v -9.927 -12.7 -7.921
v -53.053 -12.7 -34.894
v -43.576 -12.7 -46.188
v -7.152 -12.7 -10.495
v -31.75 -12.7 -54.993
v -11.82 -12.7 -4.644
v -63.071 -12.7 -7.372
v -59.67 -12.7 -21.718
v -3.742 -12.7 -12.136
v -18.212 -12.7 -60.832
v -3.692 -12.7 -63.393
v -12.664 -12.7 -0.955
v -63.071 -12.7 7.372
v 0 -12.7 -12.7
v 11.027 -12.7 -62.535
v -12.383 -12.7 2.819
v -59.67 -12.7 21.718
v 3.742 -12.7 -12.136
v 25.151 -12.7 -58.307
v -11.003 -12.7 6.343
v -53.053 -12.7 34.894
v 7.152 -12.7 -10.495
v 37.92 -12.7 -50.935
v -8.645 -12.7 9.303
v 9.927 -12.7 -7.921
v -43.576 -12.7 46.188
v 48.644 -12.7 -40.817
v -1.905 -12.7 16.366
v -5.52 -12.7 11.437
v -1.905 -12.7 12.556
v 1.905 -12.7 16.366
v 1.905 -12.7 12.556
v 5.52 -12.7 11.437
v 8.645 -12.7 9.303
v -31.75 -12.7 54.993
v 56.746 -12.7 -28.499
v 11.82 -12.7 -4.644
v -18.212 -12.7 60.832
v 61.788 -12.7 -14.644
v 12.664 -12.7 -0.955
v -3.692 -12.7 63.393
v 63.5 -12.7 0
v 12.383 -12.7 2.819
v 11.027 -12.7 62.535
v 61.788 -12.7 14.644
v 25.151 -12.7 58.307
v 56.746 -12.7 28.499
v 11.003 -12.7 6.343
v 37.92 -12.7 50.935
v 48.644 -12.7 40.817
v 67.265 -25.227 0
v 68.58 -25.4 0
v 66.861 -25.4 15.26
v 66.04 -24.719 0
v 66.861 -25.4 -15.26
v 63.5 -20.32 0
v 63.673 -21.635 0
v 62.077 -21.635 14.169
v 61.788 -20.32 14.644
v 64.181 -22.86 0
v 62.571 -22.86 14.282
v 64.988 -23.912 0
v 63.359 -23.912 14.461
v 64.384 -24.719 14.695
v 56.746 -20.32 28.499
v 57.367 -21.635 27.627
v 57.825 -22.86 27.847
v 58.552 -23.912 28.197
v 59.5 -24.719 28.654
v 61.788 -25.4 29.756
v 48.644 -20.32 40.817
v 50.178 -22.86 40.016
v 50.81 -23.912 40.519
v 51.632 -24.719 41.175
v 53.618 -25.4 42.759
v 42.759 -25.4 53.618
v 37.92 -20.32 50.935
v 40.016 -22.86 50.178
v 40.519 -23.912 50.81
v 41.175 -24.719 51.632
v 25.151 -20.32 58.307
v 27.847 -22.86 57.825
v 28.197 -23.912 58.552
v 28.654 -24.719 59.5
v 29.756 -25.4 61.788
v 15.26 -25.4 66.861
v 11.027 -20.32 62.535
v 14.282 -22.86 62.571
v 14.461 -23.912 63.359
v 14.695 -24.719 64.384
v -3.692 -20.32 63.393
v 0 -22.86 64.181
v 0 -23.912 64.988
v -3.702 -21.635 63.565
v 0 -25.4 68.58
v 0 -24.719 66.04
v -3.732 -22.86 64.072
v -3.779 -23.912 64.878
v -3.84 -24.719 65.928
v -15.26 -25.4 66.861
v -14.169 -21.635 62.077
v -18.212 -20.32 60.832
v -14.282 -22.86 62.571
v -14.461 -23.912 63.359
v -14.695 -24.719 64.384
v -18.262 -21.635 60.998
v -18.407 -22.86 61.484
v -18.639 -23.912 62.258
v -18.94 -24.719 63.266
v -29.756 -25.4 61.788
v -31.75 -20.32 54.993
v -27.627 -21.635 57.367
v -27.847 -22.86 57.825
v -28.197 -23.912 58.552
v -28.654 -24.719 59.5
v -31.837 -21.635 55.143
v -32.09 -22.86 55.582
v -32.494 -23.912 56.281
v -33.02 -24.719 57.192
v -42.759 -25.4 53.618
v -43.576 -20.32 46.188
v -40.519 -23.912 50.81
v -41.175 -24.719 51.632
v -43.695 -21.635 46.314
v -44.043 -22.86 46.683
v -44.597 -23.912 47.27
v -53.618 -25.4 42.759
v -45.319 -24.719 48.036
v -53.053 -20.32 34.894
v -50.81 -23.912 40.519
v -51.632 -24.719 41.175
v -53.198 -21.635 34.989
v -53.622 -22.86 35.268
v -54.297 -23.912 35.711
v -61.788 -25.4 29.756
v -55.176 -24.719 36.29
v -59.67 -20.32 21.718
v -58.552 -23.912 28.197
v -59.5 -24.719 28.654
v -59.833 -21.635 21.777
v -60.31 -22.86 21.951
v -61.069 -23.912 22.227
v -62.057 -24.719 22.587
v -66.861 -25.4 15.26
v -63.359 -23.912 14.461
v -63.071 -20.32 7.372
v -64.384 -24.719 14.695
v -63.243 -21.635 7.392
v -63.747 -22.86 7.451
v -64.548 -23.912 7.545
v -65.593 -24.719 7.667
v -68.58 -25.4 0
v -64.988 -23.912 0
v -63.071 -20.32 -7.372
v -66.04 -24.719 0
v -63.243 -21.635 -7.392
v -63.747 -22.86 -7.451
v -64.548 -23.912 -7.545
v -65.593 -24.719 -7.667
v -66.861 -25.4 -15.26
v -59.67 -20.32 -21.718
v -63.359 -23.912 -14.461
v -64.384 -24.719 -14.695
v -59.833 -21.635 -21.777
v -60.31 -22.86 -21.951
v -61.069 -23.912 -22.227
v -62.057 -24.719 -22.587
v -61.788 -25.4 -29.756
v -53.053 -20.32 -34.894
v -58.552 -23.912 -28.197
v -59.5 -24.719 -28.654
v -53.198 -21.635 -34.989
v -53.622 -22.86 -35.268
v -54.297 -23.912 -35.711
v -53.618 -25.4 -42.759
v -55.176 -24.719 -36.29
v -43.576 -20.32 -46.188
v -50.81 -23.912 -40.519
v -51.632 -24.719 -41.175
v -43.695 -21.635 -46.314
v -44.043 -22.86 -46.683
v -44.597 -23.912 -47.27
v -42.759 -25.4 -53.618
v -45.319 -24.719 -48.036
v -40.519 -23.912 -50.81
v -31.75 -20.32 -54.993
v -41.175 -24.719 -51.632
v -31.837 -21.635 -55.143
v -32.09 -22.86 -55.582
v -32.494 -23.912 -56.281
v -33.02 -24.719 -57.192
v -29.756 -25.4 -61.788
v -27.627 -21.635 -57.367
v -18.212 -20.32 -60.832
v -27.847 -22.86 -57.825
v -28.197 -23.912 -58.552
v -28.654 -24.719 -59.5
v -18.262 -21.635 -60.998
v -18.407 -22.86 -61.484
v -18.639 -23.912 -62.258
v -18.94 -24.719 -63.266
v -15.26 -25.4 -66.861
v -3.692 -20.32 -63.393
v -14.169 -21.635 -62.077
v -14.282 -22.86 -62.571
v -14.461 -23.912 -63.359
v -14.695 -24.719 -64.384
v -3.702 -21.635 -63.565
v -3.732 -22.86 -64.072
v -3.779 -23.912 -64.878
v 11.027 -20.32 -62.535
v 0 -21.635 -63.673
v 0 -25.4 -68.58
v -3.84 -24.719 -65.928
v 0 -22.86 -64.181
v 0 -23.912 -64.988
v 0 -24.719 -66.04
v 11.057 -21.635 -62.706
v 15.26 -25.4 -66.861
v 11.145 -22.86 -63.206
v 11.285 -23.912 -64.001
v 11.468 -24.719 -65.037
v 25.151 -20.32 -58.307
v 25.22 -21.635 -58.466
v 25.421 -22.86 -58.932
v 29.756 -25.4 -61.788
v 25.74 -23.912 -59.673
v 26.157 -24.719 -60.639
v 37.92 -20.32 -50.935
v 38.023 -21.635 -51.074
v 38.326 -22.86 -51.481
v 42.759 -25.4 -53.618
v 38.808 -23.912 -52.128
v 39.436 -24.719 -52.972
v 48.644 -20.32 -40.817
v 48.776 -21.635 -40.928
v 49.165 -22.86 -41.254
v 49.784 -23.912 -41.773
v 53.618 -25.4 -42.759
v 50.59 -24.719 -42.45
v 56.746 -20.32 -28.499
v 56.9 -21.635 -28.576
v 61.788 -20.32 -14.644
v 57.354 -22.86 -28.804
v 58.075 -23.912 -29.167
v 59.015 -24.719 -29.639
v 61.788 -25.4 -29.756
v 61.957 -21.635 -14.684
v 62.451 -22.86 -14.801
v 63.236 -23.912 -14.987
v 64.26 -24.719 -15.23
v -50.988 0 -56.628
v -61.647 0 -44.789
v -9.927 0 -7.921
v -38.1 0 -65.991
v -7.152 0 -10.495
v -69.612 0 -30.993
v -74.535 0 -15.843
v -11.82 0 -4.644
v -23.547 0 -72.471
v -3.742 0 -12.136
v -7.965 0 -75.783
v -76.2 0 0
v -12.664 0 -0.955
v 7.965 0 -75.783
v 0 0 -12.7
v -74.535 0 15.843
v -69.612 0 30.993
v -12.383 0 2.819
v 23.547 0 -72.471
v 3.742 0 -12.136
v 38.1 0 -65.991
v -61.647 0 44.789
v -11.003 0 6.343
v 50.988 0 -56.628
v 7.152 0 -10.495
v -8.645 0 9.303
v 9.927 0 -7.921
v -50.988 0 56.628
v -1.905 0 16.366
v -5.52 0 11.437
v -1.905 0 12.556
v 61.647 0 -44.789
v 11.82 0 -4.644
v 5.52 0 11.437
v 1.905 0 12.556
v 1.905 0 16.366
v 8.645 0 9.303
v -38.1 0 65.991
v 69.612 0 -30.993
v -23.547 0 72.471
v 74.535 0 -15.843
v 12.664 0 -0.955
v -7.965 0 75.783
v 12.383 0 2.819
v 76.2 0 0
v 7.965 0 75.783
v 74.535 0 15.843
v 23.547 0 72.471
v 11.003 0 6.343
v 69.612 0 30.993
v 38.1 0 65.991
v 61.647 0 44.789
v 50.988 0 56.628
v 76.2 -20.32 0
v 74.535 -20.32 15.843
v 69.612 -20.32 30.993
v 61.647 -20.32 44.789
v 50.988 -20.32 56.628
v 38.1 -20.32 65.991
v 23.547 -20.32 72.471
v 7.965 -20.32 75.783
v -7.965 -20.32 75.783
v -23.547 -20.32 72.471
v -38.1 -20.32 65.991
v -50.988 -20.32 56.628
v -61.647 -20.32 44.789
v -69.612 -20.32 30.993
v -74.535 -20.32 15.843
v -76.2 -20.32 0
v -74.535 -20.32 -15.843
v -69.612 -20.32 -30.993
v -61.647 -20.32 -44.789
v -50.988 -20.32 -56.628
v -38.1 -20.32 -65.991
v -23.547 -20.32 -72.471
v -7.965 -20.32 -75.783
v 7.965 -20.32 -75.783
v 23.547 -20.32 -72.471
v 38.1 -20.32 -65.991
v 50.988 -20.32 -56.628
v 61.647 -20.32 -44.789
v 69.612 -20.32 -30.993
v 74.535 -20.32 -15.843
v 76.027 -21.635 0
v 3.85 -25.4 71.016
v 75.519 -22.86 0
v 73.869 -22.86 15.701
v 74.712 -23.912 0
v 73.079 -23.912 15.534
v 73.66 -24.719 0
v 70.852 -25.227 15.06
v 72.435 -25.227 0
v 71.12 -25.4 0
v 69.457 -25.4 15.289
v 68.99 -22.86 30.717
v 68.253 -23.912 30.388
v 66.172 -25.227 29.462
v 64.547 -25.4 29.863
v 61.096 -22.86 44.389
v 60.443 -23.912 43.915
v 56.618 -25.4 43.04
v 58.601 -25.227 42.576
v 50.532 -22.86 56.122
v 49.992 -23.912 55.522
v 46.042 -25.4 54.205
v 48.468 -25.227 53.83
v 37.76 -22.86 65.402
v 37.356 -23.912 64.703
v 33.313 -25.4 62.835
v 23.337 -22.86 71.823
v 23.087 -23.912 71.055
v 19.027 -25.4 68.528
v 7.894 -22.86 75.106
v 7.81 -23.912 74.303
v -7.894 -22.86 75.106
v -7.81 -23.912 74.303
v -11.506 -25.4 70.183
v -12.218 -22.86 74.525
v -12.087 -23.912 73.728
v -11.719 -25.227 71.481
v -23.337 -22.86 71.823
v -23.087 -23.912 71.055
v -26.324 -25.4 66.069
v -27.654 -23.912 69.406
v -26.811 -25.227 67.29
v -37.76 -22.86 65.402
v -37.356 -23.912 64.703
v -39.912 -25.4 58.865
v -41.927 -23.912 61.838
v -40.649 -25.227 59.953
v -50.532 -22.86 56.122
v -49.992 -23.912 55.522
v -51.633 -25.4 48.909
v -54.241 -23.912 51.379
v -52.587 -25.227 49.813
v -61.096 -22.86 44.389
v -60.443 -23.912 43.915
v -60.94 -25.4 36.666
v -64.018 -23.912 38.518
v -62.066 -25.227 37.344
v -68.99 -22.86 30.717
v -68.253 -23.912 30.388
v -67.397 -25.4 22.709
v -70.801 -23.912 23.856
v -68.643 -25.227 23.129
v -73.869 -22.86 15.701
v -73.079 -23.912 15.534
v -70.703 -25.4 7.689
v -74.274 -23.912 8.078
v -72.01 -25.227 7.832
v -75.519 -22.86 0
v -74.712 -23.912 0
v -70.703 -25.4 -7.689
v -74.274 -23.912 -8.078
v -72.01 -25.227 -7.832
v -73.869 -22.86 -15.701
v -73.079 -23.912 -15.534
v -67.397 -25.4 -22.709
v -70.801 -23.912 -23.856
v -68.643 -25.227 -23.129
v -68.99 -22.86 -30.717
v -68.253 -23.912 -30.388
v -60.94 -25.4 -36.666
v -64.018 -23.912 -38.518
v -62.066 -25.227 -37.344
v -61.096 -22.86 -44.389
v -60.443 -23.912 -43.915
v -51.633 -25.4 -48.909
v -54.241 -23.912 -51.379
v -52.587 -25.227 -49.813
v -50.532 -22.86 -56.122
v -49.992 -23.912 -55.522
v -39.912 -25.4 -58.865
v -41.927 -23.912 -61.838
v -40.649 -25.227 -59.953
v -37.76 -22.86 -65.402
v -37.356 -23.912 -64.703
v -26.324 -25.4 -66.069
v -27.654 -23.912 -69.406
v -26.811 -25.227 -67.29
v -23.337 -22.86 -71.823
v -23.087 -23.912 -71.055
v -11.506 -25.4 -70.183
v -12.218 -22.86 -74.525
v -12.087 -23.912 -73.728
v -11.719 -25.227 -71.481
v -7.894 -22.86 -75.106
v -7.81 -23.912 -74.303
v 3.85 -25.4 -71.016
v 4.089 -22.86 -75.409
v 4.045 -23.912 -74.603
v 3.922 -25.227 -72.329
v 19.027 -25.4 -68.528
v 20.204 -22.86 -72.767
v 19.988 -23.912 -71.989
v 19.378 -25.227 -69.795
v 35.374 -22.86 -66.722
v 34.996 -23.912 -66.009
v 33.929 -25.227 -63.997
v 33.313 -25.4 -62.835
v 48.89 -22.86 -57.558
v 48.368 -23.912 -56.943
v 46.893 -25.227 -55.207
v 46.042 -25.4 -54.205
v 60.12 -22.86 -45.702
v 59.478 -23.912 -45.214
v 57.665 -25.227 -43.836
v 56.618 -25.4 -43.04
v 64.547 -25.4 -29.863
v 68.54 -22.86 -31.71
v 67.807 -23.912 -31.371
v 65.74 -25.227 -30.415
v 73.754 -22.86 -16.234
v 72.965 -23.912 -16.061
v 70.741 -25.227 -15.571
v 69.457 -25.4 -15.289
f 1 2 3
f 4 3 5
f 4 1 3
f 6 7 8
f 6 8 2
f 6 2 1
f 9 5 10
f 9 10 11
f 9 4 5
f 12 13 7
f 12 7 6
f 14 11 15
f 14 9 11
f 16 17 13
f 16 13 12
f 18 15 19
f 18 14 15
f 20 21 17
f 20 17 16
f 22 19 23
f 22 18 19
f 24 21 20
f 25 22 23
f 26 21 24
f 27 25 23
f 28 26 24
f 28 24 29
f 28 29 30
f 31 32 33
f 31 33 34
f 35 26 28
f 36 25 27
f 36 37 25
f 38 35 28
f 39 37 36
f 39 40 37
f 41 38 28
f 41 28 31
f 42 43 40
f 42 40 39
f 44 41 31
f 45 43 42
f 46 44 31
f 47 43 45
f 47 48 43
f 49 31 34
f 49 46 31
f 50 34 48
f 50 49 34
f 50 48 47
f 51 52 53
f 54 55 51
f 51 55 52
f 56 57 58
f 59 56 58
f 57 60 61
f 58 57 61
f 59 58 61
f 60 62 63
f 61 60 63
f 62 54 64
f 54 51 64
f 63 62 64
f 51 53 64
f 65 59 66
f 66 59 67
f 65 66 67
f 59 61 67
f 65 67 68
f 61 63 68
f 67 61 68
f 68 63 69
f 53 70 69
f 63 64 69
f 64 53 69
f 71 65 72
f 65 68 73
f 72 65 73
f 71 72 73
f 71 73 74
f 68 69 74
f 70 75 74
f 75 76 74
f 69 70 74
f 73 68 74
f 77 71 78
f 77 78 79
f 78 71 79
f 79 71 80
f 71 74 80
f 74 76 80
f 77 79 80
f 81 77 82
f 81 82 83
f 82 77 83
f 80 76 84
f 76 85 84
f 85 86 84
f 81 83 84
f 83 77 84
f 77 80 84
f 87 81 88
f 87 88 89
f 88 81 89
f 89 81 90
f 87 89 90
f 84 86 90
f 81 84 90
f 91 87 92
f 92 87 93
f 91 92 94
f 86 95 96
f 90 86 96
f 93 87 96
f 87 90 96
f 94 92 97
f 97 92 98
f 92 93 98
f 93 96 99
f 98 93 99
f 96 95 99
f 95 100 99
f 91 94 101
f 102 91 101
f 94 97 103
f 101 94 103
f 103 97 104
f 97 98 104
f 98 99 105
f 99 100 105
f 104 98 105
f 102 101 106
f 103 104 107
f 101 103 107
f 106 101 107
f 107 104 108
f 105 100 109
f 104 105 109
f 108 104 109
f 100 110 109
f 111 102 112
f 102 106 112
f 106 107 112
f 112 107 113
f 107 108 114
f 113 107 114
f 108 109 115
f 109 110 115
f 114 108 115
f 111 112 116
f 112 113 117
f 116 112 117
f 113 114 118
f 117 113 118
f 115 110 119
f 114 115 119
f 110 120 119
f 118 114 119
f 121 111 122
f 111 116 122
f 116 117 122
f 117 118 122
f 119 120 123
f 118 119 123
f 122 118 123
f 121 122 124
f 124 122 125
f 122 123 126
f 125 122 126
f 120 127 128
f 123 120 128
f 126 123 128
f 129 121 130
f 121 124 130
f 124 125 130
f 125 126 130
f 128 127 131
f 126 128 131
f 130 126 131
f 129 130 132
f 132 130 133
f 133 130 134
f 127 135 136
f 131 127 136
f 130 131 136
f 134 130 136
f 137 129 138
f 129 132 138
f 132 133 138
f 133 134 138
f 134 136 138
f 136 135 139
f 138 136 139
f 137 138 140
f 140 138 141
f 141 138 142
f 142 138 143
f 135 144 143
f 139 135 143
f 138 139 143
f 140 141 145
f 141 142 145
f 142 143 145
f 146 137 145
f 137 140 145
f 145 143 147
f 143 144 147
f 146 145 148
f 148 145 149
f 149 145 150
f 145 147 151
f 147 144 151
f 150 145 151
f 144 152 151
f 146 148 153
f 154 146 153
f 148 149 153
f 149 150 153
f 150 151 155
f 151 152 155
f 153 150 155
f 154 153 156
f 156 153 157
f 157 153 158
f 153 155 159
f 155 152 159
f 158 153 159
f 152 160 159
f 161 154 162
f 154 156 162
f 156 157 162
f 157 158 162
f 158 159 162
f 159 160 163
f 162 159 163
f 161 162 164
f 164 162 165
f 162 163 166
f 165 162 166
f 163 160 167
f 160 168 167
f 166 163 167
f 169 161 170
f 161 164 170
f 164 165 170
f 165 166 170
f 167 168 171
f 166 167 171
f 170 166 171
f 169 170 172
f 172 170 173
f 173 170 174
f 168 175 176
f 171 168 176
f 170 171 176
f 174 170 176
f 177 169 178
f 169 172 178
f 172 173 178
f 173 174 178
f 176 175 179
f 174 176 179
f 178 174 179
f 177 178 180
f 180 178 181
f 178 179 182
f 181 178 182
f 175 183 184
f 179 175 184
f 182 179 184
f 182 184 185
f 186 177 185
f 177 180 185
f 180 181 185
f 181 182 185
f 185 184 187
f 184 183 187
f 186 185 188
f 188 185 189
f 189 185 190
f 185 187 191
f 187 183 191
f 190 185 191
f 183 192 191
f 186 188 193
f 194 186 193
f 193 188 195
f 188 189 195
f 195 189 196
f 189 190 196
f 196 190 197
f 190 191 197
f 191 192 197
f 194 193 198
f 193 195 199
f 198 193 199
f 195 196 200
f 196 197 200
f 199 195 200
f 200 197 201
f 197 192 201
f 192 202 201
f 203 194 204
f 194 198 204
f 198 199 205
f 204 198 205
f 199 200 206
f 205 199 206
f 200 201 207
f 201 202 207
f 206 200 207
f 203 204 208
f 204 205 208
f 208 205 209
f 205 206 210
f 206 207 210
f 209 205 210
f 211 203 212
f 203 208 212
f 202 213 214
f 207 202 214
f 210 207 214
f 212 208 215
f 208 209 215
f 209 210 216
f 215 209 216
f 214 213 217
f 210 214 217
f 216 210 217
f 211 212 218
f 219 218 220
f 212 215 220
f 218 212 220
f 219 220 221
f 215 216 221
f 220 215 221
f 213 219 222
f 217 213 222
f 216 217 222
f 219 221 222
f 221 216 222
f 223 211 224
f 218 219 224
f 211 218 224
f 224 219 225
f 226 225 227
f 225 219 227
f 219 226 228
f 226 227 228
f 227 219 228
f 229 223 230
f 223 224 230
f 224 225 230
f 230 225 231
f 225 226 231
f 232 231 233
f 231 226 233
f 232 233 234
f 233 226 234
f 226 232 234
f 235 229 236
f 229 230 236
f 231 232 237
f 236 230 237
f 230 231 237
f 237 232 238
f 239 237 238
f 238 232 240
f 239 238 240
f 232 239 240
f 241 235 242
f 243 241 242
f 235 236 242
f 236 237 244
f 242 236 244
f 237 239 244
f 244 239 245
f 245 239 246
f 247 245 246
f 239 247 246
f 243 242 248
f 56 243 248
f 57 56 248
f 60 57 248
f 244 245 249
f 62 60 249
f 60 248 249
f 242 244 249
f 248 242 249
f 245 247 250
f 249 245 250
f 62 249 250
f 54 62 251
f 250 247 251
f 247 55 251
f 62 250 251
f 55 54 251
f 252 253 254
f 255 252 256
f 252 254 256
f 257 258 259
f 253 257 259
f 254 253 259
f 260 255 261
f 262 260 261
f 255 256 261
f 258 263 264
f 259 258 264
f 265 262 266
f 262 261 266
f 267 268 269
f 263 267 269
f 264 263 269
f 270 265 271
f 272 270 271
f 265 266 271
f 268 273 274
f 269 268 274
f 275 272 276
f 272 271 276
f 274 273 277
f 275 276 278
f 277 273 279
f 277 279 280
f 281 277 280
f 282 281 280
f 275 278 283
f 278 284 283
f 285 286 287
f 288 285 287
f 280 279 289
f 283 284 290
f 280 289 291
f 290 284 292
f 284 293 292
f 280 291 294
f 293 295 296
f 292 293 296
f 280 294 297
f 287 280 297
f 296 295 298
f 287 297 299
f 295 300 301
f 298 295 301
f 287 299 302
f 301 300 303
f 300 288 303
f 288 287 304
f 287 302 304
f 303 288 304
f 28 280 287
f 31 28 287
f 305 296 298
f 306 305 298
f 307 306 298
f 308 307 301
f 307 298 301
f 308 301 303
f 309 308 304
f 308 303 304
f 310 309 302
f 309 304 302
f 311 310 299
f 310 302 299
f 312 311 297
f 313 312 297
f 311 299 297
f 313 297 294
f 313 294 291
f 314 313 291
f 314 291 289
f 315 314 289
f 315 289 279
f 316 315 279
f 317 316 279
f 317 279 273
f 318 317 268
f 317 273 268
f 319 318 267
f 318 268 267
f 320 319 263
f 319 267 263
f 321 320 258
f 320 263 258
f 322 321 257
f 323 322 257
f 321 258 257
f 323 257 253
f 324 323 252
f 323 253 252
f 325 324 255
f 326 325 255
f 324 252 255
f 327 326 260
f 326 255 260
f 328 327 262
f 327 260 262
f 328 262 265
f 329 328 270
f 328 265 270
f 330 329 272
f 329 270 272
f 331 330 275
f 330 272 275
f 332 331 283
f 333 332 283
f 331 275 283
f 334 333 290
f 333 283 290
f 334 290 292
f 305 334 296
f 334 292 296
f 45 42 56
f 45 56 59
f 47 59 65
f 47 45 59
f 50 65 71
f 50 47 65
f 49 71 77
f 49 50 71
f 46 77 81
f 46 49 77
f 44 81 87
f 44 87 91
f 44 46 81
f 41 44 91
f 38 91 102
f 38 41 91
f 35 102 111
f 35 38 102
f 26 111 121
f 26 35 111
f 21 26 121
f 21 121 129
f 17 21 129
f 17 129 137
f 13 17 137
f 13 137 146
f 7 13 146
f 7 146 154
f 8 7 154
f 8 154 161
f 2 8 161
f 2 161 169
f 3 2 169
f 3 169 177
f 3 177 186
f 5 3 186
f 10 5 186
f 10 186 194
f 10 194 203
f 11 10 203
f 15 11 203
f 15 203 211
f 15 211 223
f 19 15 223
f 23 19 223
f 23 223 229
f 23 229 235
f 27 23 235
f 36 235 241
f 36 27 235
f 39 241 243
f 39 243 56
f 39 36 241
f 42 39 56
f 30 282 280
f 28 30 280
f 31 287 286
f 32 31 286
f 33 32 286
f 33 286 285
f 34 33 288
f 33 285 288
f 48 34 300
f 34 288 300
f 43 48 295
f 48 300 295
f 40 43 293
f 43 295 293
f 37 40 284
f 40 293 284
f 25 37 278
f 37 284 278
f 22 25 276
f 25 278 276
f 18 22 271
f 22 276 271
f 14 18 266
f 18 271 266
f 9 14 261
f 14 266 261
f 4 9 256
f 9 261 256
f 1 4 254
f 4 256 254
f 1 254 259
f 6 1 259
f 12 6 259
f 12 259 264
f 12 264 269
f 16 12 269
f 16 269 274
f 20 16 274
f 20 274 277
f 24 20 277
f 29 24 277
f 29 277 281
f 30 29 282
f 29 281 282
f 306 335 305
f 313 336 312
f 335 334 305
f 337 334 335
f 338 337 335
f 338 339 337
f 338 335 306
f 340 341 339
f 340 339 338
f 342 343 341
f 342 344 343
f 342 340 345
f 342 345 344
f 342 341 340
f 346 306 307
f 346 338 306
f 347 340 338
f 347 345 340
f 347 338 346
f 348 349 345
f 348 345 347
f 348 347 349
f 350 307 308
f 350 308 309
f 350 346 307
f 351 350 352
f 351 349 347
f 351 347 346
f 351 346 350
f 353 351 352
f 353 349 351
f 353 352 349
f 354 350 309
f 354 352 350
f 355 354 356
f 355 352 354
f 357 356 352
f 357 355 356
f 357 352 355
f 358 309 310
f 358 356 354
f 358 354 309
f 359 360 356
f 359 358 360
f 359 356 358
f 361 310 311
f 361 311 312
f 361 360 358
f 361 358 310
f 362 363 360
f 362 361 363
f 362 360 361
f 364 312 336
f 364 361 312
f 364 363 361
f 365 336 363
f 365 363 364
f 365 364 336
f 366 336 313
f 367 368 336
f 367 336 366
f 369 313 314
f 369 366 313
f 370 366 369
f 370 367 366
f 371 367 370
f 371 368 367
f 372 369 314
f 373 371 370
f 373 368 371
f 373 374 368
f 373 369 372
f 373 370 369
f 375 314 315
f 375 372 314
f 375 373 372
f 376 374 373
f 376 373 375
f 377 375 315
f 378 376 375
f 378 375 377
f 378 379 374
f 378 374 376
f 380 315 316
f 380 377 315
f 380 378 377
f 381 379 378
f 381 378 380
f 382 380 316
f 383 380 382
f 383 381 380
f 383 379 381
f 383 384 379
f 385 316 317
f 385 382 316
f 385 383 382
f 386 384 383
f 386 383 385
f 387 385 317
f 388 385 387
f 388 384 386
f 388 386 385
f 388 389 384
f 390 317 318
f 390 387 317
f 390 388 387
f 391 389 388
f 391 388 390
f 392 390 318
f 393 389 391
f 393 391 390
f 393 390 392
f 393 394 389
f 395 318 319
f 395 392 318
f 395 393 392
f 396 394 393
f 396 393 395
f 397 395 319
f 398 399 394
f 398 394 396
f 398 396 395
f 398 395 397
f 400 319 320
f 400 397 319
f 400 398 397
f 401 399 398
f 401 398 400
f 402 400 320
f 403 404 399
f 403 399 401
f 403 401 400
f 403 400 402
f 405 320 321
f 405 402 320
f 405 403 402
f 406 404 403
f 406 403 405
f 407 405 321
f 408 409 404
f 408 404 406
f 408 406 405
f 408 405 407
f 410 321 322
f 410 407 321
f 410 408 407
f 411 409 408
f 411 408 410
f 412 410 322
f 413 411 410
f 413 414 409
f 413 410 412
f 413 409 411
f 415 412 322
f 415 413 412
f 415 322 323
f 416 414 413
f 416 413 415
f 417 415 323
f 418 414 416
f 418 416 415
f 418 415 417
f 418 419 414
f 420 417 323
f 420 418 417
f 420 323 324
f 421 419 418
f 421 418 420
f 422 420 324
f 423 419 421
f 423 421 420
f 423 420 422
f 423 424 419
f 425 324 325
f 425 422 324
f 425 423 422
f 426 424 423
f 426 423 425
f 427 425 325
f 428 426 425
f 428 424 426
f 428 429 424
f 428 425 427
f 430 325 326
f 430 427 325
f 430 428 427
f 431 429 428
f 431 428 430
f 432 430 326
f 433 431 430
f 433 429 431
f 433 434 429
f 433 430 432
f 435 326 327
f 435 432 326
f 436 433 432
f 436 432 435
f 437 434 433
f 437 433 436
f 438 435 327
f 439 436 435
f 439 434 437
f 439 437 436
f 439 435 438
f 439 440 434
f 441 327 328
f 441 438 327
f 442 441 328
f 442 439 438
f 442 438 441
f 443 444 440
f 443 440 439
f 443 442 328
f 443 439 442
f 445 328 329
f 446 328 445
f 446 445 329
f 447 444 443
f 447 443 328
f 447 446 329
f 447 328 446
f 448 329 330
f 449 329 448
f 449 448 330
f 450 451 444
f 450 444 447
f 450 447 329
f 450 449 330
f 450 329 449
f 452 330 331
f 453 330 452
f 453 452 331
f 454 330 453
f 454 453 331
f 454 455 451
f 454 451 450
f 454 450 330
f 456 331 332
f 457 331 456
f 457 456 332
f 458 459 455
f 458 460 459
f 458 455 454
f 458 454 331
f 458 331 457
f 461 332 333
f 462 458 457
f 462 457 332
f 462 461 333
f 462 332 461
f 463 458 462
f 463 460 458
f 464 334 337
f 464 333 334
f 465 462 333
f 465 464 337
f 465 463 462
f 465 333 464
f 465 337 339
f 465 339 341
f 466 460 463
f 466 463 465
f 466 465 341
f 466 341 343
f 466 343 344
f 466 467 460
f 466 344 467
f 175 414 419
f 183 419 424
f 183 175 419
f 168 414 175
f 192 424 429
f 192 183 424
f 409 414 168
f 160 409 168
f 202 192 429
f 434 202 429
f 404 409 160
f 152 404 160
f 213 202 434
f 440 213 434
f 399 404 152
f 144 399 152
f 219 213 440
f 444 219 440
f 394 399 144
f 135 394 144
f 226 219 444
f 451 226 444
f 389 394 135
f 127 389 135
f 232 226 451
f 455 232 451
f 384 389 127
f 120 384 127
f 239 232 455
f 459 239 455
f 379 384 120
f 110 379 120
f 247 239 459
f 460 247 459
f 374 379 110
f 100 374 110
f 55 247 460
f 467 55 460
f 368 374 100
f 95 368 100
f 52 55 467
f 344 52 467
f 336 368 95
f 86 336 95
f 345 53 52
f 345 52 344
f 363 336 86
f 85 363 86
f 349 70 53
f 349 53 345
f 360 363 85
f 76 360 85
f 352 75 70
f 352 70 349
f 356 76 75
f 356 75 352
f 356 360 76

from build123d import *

# Parameters (mm, degrees)
F0_R     = 76.2
F0_R_2   = 63.5
F1_DEPTH = 25.4
F2_DEPTH = 12.7
F3_R     = 5.08


with BuildPart() as f1:
    # F0 (on Front) → F1 (new body)
    with BuildSketch(Plane.XZ):
        Circle(F0_R)
        Circle(F0_R_2, mode=Mode.SUBTRACT)
    extrude(amount=F1_DEPTH)

    # F0 (on Front) → F2 (join)
    with BuildSketch(Plane.XZ):
        Circle(F0_R_2)
        with BuildLine():
            ThreePointArc((1.905, 12.556312), (0, -12.7), (-1.905, 12.556312))
            Line((-1.905, 12.556312), (-1.905, 16.366312))
            Line((-1.905, 16.366312), (1.905, 16.366312))
            Line((1.905, 16.366312), (1.905, 12.556312))
        make_face(mode=Mode.SUBTRACT)
    extrude(amount=F2_DEPTH)

    # F3
    f3_edges = [f1.edges().sort_by_distance(p)[0] for p in [
        (-76.2, -25.4, 0),
        (-63.5, -25.4, 0),
    ]]
    fillet(f3_edges, radius=F3_R)


solid = f1.part
